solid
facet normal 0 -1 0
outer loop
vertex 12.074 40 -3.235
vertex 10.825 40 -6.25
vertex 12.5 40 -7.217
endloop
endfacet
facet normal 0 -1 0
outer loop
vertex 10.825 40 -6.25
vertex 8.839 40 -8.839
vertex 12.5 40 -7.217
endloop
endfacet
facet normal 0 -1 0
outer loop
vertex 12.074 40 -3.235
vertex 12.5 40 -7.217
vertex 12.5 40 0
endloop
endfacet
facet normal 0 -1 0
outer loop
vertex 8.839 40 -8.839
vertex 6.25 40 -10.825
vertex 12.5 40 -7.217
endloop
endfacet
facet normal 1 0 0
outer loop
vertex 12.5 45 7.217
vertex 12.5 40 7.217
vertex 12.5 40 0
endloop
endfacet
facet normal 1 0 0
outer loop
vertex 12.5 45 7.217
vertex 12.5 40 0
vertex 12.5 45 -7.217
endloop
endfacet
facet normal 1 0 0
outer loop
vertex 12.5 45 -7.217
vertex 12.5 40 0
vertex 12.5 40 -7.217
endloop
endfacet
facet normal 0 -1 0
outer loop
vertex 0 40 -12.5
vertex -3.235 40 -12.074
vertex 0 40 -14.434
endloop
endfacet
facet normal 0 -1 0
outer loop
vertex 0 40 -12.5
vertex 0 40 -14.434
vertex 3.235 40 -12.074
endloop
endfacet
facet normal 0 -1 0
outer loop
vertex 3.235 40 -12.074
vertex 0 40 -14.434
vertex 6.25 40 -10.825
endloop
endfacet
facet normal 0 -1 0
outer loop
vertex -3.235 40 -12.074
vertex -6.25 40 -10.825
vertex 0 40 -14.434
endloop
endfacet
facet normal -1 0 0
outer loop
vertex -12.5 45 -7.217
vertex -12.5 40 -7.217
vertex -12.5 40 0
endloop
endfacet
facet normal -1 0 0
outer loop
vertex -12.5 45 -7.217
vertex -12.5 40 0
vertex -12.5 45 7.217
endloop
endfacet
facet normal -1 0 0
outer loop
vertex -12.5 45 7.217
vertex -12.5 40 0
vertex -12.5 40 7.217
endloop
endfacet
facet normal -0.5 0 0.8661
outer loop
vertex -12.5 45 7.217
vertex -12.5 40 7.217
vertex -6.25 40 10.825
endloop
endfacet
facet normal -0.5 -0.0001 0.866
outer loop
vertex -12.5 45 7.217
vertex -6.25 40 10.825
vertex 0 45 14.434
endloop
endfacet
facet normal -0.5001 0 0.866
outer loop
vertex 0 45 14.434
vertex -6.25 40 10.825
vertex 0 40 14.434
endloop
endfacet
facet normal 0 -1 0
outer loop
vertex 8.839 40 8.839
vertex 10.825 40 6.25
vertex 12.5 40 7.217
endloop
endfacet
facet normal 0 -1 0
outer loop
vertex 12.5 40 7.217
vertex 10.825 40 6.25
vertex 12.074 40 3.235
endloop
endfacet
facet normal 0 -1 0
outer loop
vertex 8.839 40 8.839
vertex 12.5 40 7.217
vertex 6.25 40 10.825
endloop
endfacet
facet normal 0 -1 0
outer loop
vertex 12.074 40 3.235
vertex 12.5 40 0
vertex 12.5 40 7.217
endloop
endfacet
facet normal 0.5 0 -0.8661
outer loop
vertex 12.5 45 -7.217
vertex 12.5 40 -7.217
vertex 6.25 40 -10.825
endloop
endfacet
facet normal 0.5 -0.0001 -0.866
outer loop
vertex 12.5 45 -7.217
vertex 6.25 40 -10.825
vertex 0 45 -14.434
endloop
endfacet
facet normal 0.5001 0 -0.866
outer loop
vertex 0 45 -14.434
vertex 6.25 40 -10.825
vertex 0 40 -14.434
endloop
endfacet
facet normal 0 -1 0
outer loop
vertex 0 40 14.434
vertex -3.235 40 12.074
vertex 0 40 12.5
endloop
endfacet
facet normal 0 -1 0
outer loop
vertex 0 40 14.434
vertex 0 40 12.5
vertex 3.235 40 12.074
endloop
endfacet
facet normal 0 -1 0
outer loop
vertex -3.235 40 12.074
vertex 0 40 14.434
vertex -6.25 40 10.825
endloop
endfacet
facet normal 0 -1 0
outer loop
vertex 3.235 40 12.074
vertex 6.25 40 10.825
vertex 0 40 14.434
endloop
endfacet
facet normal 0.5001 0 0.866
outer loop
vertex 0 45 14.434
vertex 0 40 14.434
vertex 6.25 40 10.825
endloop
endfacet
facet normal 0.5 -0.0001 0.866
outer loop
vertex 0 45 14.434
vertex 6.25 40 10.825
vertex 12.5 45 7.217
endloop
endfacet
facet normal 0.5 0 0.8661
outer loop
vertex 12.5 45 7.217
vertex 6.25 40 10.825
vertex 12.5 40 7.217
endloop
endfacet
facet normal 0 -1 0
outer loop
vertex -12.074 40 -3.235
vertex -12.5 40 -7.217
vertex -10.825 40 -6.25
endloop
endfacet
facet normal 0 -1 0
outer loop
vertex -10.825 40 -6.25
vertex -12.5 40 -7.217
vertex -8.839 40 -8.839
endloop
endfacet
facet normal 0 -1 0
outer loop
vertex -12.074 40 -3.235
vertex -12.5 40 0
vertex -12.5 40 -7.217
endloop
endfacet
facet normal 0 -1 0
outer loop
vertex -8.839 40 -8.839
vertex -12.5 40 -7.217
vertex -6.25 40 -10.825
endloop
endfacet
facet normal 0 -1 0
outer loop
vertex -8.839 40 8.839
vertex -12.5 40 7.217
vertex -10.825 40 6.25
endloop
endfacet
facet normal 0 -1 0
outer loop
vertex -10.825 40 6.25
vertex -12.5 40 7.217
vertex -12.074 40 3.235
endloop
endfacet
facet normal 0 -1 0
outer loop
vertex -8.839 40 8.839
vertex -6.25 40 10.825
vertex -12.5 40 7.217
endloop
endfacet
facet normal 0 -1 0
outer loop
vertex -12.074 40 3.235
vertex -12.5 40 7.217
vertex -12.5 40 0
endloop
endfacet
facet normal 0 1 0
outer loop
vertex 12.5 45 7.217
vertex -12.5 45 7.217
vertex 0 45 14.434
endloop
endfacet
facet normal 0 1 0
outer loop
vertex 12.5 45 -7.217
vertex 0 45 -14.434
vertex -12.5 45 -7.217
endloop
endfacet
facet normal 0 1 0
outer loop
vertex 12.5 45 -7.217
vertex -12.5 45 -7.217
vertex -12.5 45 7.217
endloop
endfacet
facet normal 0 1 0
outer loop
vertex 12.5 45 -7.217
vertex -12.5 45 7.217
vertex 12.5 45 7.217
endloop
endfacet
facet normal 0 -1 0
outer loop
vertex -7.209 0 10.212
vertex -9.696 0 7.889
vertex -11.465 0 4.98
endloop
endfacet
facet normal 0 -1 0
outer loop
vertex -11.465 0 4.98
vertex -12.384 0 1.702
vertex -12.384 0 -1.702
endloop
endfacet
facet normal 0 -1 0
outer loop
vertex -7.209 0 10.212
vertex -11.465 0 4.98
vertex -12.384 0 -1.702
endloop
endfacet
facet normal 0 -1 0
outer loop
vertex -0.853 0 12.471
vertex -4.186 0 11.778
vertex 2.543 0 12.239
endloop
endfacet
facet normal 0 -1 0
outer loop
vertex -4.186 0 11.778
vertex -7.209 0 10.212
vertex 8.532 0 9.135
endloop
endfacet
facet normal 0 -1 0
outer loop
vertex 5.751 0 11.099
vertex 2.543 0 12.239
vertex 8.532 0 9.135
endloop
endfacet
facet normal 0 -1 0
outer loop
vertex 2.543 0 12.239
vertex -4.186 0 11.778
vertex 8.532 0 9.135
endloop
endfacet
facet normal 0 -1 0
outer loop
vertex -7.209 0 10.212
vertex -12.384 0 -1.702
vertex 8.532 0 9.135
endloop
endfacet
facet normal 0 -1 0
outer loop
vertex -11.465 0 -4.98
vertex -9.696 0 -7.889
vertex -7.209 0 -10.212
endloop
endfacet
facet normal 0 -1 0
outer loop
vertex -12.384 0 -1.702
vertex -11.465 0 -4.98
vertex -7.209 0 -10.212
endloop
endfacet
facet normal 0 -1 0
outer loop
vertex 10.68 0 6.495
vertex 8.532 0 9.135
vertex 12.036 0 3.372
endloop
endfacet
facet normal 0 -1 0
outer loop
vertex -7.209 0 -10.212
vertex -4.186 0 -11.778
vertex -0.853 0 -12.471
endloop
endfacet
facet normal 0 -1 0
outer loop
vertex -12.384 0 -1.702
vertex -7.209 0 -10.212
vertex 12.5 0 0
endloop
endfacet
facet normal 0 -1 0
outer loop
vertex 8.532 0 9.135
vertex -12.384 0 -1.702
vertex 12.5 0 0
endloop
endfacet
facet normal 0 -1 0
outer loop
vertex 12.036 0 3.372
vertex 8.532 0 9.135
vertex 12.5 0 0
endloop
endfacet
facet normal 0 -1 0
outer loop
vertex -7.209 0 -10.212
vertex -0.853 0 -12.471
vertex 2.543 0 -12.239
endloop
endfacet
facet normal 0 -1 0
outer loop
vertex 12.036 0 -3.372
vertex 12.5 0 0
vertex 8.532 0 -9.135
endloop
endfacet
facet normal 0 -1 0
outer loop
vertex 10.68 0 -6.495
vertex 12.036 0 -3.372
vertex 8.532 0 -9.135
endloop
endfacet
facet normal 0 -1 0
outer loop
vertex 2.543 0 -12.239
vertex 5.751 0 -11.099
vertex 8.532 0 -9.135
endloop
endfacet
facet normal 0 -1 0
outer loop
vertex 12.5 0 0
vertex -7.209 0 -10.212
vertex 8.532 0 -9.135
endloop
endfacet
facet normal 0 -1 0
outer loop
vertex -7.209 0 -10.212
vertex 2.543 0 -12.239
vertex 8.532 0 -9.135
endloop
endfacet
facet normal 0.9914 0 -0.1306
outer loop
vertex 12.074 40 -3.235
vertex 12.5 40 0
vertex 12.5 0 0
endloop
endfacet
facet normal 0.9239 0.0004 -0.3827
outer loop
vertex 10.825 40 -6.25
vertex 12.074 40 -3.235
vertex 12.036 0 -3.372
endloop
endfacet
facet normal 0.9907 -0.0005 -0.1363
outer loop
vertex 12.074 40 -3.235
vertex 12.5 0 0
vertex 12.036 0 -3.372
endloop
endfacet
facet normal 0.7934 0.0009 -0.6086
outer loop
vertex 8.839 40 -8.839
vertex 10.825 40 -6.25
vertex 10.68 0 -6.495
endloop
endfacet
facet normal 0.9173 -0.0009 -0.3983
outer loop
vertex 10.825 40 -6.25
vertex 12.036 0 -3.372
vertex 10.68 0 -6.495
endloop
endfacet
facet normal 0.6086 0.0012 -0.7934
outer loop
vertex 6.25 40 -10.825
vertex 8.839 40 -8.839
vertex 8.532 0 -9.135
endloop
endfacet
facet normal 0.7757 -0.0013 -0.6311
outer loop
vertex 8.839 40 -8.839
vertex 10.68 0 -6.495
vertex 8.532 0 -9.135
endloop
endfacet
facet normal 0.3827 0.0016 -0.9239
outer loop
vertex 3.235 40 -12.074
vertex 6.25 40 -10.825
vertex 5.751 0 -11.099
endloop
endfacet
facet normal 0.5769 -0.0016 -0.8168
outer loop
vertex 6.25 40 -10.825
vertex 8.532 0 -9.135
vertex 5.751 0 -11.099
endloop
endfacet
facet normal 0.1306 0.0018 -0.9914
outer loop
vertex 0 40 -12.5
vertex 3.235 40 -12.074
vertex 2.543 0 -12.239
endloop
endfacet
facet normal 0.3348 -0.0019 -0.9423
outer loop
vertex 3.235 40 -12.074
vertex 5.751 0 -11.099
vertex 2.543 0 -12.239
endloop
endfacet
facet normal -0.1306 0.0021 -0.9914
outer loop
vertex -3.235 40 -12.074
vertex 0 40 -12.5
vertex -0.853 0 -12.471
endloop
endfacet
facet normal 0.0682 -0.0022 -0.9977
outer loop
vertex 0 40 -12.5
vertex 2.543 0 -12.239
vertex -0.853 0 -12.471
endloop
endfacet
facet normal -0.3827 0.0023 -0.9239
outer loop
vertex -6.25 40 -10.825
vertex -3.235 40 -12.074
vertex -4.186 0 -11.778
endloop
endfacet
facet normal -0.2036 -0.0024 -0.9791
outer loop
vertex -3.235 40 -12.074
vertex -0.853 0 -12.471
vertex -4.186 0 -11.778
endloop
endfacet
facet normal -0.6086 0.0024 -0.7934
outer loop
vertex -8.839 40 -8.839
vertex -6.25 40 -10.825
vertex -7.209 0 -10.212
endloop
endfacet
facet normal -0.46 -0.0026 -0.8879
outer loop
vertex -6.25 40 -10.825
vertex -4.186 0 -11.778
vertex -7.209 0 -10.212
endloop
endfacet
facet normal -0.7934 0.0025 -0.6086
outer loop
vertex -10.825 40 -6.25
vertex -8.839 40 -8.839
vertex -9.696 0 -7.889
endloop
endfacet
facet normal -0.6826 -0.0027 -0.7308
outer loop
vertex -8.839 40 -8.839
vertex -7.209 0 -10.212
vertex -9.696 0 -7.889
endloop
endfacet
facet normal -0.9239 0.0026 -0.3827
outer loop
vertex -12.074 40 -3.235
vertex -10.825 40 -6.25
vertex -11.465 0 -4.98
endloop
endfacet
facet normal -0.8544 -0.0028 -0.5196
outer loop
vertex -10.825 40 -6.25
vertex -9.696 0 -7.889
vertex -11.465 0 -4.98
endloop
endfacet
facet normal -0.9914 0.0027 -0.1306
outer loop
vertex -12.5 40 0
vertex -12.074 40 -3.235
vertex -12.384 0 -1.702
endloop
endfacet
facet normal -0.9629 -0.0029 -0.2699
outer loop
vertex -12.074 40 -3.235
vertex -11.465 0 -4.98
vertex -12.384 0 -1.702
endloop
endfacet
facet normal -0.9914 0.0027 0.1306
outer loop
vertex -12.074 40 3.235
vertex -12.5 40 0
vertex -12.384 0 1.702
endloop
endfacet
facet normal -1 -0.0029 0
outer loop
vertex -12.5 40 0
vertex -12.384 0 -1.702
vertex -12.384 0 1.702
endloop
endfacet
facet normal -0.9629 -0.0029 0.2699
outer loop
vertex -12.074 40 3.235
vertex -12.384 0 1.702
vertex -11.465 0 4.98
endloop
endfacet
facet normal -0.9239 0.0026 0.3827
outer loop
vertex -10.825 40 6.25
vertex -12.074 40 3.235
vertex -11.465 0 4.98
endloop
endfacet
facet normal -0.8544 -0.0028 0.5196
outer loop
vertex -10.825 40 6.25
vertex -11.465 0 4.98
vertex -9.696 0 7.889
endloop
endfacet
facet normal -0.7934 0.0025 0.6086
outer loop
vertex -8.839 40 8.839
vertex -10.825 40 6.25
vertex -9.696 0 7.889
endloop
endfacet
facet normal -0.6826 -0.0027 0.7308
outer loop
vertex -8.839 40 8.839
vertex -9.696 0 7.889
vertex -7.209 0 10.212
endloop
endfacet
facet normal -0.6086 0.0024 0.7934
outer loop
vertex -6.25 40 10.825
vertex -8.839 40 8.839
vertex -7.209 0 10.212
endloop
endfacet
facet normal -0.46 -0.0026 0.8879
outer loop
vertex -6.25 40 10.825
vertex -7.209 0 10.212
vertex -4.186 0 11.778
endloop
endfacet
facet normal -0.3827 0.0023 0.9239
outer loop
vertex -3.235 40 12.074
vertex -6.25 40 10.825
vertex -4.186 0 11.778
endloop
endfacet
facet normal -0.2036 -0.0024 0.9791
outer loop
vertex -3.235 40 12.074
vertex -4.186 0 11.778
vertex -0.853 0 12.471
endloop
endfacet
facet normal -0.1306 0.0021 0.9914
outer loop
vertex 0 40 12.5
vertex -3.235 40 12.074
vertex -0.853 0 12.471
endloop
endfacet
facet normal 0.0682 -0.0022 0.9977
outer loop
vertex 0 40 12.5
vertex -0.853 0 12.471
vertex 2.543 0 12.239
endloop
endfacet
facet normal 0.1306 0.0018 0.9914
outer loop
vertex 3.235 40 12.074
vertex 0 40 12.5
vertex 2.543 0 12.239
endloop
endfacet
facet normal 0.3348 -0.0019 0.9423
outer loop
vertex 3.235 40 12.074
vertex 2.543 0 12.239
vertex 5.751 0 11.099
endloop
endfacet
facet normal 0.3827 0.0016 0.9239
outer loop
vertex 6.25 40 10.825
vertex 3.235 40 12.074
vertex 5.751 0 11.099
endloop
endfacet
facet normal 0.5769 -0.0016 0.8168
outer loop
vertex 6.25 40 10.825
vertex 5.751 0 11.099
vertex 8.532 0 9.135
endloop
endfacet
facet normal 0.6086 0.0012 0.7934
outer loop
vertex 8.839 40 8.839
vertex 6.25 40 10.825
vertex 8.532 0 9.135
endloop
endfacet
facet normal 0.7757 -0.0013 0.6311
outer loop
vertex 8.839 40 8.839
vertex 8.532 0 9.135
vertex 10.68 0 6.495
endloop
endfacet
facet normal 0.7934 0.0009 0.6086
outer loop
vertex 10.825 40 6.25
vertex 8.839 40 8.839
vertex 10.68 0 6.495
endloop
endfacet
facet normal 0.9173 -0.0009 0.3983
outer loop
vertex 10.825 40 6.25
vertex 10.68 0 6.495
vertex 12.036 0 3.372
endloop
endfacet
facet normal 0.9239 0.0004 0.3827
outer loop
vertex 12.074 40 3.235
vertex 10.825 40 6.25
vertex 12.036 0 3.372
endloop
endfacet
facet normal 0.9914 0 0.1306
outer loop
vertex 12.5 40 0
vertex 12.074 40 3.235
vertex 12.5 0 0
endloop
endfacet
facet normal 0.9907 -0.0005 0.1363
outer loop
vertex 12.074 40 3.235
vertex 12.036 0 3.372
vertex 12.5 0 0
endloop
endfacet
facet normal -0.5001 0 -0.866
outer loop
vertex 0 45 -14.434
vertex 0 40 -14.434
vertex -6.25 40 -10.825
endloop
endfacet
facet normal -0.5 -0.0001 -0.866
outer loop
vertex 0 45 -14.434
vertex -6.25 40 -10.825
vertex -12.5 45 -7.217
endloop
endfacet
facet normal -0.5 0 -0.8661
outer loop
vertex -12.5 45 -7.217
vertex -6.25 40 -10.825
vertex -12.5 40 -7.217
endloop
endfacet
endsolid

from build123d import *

# Parameters (mm, degrees)
SKETCH1_R           = 12.5
BOSS_EXTRUDE1_DEPTH = 40
BOSS_EXTRUDE2_DEPTH = 5


with BuildPart() as part:
    # Sketch1 → Boss-Extrude1 (new body)
    with BuildSketch(Plane(origin=(0, 0, 0), x_dir=(1, 0, 0), z_dir=(0, 1, 0))):
        Circle(SKETCH1_R)
    extrude(amount=BOSS_EXTRUDE1_DEPTH)

    # Sketch2 → Boss-Extrude2 (add)
    with BuildSketch(Plane(origin=(0, 40, 0), x_dir=(1, 0, 0), z_dir=(0, 1, 0))):
        Polygon((0, -14.43375673), (12.5, -7.216878365), (12.5, 7.216878365), (0, 14.43375673), (-12.5, 7.216878365), (-12.5, -7.216878365), align=None)
    extrude(amount=BOSS_EXTRUDE2_DEPTH)


solid = part.part
